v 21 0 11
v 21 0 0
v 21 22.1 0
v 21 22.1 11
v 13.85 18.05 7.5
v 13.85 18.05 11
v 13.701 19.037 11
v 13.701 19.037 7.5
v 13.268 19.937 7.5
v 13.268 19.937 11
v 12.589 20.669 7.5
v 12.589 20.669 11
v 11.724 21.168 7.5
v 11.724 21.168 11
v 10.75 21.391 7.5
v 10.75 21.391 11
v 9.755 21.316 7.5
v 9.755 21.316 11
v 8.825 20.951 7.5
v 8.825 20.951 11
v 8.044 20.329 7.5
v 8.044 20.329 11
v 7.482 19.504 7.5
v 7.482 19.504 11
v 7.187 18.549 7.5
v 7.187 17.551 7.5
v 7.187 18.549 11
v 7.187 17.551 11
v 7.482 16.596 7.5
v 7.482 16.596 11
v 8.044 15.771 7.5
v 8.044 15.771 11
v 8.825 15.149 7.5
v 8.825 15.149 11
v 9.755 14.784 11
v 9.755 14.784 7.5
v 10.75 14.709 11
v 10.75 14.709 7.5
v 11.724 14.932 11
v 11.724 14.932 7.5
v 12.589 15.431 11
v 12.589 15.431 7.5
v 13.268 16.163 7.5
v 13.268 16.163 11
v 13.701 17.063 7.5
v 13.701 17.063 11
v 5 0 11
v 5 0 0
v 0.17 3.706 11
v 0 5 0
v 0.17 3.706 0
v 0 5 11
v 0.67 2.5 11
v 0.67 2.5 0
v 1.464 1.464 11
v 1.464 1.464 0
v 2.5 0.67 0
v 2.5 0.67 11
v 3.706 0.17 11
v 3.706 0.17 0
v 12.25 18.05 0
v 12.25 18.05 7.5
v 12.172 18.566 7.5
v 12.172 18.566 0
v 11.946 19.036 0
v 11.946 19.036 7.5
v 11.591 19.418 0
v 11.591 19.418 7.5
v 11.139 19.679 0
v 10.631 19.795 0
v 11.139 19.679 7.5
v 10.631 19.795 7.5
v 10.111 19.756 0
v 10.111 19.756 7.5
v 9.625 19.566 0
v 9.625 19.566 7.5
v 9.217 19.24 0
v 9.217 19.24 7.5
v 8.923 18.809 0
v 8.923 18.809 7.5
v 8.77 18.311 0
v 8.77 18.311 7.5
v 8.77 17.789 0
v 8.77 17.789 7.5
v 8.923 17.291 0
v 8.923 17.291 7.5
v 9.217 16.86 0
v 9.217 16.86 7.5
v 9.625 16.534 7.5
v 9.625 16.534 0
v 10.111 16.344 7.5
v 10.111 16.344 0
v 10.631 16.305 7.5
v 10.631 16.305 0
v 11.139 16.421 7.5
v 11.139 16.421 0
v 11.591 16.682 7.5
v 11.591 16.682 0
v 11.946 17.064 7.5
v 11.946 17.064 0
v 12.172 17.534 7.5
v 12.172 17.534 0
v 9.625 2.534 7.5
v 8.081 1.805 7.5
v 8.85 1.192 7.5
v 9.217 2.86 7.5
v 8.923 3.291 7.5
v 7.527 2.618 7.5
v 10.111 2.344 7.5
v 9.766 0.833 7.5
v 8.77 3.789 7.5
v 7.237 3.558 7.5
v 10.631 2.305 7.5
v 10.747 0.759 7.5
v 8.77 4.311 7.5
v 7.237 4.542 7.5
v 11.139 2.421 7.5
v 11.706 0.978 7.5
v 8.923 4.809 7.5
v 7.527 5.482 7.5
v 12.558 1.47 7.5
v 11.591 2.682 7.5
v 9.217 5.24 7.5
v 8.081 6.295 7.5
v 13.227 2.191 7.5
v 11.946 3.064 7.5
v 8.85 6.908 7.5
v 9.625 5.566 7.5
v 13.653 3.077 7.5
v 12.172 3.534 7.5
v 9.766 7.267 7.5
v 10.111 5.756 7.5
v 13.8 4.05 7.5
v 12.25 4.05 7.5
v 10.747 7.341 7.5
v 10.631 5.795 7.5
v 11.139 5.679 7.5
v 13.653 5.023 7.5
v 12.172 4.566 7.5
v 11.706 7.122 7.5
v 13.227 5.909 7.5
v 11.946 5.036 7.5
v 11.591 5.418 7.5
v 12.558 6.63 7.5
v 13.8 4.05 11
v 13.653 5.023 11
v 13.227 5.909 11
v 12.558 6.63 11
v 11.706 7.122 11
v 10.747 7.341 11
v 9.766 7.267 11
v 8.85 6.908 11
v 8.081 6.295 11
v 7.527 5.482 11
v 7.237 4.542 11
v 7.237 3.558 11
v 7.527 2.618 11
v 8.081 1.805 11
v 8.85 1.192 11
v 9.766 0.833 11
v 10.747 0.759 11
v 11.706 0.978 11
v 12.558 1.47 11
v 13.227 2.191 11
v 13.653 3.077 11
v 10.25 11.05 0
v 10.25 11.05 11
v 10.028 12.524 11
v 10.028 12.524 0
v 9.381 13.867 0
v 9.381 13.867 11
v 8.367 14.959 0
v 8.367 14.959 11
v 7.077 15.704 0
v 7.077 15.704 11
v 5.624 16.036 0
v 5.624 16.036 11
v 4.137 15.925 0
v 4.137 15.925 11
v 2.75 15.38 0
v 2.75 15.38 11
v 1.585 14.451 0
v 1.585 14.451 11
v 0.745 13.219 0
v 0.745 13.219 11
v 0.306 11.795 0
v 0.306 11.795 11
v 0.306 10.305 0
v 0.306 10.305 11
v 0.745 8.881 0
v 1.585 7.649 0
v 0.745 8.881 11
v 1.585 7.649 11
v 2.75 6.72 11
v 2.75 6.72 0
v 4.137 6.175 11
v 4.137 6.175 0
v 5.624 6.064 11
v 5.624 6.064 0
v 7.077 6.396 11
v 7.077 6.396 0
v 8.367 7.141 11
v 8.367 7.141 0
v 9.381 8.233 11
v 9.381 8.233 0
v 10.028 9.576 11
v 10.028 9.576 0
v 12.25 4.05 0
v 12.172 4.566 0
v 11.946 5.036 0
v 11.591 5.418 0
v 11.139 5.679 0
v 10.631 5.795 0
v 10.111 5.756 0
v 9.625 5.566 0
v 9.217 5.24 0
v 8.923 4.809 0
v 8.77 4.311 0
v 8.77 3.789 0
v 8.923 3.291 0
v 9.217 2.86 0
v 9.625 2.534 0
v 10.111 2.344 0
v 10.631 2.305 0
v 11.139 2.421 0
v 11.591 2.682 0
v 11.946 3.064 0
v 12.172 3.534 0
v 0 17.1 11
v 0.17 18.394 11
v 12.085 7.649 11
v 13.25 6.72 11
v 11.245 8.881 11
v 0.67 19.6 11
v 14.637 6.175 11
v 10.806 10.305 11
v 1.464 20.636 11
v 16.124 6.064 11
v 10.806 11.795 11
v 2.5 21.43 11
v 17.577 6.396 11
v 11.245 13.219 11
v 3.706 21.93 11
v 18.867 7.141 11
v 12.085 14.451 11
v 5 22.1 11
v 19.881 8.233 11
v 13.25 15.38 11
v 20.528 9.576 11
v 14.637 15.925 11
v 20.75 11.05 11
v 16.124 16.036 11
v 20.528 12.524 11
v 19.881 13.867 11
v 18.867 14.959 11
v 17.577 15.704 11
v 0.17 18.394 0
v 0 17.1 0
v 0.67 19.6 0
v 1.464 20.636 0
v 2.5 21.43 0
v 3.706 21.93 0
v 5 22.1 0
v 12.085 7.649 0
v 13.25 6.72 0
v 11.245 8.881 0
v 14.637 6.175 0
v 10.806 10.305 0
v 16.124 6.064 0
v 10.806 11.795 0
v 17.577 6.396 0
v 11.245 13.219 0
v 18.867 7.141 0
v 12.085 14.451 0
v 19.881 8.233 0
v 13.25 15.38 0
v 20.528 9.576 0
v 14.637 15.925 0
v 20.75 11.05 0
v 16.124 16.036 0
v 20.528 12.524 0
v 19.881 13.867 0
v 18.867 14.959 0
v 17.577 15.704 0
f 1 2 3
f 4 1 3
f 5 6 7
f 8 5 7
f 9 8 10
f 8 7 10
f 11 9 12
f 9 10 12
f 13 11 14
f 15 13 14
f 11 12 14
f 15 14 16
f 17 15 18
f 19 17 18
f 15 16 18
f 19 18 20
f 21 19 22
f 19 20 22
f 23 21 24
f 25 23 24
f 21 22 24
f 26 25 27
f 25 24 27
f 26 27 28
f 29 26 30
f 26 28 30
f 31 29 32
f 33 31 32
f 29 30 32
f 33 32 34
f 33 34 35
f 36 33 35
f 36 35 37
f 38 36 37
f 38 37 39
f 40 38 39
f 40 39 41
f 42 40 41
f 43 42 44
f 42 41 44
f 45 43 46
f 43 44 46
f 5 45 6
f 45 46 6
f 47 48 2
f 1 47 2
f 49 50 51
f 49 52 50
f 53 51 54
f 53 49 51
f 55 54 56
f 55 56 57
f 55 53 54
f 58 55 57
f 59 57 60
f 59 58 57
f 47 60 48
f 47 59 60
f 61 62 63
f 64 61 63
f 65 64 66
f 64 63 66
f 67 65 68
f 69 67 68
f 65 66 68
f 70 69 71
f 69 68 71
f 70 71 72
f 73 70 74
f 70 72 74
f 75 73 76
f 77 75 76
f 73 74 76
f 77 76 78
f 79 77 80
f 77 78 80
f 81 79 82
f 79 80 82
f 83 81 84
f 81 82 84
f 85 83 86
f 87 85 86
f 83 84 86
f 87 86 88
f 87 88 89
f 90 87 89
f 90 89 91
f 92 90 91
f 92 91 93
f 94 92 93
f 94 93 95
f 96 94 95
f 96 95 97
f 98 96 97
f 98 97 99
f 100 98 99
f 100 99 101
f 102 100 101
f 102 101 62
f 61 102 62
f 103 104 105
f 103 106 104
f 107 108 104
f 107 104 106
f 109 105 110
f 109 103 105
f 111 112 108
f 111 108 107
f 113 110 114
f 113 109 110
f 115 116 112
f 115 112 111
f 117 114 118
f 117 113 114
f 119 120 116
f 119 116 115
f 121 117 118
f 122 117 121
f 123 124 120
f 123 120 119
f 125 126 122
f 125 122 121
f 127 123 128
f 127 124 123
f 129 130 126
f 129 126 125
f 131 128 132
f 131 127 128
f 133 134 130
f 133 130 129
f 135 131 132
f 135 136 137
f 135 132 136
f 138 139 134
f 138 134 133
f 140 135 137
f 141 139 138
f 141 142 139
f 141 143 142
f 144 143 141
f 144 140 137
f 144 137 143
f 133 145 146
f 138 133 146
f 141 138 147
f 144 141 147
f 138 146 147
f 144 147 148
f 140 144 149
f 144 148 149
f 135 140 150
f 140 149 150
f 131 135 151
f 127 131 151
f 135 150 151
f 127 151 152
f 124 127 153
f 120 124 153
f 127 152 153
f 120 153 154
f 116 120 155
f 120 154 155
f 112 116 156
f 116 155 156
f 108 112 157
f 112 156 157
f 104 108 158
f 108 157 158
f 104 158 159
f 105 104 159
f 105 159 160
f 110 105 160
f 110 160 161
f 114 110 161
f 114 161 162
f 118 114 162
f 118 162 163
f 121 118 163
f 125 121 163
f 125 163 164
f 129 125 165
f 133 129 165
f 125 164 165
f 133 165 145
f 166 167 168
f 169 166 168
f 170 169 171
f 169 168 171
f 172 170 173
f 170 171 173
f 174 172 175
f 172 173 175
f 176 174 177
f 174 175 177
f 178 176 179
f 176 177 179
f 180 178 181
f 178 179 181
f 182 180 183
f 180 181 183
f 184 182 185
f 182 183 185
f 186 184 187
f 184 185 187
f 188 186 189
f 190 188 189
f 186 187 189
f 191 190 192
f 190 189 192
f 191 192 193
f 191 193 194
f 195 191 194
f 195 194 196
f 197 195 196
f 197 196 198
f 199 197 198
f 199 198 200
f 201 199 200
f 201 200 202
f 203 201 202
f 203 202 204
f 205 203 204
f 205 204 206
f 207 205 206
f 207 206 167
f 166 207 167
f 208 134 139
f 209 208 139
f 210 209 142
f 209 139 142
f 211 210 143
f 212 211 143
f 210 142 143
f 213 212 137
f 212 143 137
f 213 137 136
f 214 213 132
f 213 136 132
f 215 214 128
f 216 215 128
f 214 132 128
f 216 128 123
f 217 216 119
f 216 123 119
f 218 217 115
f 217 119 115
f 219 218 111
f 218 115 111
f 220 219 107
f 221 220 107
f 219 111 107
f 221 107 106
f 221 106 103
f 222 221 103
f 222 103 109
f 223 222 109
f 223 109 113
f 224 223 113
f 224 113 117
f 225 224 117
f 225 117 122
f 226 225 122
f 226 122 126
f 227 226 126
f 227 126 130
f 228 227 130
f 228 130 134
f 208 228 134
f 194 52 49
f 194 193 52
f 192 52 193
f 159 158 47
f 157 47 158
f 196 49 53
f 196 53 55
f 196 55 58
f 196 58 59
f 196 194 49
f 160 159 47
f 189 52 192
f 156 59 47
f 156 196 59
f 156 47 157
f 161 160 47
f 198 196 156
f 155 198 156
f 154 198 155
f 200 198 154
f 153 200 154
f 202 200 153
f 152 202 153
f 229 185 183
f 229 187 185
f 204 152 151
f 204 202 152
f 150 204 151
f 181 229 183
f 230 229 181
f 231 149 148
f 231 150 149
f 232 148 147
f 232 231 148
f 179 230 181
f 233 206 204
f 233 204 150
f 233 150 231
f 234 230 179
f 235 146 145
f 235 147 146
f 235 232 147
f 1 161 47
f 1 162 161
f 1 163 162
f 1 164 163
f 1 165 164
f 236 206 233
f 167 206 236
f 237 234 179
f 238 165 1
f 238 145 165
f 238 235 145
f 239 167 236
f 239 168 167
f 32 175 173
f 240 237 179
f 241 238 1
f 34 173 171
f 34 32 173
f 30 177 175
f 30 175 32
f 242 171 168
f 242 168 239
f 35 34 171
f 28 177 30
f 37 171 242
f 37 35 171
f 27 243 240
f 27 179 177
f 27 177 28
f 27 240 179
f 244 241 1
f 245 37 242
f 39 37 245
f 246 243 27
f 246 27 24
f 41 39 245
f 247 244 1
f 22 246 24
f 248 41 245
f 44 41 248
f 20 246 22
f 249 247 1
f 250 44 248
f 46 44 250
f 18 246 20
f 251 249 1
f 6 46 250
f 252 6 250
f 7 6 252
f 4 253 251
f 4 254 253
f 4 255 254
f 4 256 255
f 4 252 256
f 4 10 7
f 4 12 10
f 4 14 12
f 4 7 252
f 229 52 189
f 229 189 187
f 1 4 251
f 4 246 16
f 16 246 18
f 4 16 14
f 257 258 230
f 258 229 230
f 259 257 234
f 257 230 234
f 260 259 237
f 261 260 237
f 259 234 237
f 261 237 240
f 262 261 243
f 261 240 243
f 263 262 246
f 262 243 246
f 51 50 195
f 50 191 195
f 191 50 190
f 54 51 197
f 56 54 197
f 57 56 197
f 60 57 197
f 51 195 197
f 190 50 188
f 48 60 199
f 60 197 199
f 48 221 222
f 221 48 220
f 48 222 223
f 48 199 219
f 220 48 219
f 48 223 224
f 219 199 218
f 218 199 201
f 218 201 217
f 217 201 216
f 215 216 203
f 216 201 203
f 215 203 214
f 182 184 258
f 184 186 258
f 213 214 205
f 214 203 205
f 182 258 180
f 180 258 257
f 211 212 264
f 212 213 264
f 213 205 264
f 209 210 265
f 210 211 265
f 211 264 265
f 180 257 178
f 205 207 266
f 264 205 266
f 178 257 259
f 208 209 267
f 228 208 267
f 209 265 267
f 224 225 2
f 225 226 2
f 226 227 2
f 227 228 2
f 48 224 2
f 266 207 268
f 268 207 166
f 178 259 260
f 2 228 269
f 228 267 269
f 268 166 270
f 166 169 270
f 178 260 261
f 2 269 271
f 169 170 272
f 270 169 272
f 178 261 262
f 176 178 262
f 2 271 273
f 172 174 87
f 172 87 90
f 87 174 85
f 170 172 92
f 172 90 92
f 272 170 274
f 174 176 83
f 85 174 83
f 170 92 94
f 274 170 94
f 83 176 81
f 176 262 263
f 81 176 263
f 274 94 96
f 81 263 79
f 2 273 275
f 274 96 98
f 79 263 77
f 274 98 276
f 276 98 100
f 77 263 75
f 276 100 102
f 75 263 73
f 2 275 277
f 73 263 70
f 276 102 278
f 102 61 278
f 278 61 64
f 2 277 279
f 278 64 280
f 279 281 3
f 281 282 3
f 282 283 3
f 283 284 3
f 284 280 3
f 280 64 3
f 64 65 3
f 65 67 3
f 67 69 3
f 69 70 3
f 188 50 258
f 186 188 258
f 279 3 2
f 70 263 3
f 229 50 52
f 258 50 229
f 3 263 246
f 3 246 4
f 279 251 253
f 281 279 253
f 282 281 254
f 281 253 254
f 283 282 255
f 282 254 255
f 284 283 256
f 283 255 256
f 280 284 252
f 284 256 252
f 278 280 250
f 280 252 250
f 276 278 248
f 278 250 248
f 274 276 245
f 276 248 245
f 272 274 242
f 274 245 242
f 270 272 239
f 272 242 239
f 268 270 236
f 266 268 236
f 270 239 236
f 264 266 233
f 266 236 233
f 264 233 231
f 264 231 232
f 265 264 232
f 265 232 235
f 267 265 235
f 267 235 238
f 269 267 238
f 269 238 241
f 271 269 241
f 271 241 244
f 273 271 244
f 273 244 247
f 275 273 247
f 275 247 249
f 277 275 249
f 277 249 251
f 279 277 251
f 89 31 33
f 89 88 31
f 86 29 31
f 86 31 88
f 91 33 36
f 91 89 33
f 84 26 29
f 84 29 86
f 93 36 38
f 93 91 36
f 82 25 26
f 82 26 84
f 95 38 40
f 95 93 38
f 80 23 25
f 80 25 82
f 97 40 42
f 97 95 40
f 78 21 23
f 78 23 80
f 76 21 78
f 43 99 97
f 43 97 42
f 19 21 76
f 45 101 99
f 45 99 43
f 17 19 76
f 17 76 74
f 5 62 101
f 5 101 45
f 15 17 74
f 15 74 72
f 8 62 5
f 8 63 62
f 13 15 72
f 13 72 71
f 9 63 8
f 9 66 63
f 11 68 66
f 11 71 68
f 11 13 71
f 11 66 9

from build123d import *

# Parameters (mm, degrees)
F0_W     = 21
F0_H     = 22.1
F1_DEPTH = 11
F2_R     = 1.75
F3_DEPTH = 25
F2_R_2   = 3.35
F2_R_3   = 3.3
F4_DEPTH = 3.5
F6_R     = 5
F5_R     = 5
F7_DEPTH = 25


with BuildPart() as f1:
    # F0 (on Top) → F1 (new body)
    with BuildSketch(Plane.XY):
        with Locations((10.5, 11.05)):
            Rectangle(F0_W, F0_H)
    extrude(amount=F1_DEPTH)

    # F2 (on face) → F3 (cut)
    with BuildSketch(Plane.XY.offset(11)):
        with Locations((10.5, 18.05)):
            Circle(F2_R)
        with Locations((10.5, 4.05)):
            Circle(F2_R)
    extrude(amount=-F3_DEPTH, mode=Mode.SUBTRACT)

    # F2 (on face) → F4 (cut)
    with BuildSketch(Plane.XY.offset(11)):
        with Locations((10.5, 18.05)):
            Circle(F2_R_2)
        with Locations((10.5, 18.05)):
            Circle(F2_R, mode=Mode.SUBTRACT)
        with Locations((10.5, 4.05)):
            Circle(F2_R_3)
        with Locations((10.5, 4.05)):
            Circle(F2_R, mode=Mode.SUBTRACT)
    extrude(amount=-F4_DEPTH, mode=Mode.SUBTRACT)

    # F6
    f6_edges = [f1.edges().sort_by_distance(p)[0] for p in [
        (0, 22.1, 5.5),
        (0, 0, 5.5),
    ]]
    fillet(f6_edges, radius=F6_R)

    # F5 (on face) → F7 (cut)
    with BuildSketch(Plane.XY.offset(11)):
        with Locations((5.25, 11.05)):
            Circle(F5_R)
        with Locations((15.75, 11.05)):
            Circle(F5_R)
    extrude(amount=-F7_DEPTH, mode=Mode.SUBTRACT)


solid = f1.part
